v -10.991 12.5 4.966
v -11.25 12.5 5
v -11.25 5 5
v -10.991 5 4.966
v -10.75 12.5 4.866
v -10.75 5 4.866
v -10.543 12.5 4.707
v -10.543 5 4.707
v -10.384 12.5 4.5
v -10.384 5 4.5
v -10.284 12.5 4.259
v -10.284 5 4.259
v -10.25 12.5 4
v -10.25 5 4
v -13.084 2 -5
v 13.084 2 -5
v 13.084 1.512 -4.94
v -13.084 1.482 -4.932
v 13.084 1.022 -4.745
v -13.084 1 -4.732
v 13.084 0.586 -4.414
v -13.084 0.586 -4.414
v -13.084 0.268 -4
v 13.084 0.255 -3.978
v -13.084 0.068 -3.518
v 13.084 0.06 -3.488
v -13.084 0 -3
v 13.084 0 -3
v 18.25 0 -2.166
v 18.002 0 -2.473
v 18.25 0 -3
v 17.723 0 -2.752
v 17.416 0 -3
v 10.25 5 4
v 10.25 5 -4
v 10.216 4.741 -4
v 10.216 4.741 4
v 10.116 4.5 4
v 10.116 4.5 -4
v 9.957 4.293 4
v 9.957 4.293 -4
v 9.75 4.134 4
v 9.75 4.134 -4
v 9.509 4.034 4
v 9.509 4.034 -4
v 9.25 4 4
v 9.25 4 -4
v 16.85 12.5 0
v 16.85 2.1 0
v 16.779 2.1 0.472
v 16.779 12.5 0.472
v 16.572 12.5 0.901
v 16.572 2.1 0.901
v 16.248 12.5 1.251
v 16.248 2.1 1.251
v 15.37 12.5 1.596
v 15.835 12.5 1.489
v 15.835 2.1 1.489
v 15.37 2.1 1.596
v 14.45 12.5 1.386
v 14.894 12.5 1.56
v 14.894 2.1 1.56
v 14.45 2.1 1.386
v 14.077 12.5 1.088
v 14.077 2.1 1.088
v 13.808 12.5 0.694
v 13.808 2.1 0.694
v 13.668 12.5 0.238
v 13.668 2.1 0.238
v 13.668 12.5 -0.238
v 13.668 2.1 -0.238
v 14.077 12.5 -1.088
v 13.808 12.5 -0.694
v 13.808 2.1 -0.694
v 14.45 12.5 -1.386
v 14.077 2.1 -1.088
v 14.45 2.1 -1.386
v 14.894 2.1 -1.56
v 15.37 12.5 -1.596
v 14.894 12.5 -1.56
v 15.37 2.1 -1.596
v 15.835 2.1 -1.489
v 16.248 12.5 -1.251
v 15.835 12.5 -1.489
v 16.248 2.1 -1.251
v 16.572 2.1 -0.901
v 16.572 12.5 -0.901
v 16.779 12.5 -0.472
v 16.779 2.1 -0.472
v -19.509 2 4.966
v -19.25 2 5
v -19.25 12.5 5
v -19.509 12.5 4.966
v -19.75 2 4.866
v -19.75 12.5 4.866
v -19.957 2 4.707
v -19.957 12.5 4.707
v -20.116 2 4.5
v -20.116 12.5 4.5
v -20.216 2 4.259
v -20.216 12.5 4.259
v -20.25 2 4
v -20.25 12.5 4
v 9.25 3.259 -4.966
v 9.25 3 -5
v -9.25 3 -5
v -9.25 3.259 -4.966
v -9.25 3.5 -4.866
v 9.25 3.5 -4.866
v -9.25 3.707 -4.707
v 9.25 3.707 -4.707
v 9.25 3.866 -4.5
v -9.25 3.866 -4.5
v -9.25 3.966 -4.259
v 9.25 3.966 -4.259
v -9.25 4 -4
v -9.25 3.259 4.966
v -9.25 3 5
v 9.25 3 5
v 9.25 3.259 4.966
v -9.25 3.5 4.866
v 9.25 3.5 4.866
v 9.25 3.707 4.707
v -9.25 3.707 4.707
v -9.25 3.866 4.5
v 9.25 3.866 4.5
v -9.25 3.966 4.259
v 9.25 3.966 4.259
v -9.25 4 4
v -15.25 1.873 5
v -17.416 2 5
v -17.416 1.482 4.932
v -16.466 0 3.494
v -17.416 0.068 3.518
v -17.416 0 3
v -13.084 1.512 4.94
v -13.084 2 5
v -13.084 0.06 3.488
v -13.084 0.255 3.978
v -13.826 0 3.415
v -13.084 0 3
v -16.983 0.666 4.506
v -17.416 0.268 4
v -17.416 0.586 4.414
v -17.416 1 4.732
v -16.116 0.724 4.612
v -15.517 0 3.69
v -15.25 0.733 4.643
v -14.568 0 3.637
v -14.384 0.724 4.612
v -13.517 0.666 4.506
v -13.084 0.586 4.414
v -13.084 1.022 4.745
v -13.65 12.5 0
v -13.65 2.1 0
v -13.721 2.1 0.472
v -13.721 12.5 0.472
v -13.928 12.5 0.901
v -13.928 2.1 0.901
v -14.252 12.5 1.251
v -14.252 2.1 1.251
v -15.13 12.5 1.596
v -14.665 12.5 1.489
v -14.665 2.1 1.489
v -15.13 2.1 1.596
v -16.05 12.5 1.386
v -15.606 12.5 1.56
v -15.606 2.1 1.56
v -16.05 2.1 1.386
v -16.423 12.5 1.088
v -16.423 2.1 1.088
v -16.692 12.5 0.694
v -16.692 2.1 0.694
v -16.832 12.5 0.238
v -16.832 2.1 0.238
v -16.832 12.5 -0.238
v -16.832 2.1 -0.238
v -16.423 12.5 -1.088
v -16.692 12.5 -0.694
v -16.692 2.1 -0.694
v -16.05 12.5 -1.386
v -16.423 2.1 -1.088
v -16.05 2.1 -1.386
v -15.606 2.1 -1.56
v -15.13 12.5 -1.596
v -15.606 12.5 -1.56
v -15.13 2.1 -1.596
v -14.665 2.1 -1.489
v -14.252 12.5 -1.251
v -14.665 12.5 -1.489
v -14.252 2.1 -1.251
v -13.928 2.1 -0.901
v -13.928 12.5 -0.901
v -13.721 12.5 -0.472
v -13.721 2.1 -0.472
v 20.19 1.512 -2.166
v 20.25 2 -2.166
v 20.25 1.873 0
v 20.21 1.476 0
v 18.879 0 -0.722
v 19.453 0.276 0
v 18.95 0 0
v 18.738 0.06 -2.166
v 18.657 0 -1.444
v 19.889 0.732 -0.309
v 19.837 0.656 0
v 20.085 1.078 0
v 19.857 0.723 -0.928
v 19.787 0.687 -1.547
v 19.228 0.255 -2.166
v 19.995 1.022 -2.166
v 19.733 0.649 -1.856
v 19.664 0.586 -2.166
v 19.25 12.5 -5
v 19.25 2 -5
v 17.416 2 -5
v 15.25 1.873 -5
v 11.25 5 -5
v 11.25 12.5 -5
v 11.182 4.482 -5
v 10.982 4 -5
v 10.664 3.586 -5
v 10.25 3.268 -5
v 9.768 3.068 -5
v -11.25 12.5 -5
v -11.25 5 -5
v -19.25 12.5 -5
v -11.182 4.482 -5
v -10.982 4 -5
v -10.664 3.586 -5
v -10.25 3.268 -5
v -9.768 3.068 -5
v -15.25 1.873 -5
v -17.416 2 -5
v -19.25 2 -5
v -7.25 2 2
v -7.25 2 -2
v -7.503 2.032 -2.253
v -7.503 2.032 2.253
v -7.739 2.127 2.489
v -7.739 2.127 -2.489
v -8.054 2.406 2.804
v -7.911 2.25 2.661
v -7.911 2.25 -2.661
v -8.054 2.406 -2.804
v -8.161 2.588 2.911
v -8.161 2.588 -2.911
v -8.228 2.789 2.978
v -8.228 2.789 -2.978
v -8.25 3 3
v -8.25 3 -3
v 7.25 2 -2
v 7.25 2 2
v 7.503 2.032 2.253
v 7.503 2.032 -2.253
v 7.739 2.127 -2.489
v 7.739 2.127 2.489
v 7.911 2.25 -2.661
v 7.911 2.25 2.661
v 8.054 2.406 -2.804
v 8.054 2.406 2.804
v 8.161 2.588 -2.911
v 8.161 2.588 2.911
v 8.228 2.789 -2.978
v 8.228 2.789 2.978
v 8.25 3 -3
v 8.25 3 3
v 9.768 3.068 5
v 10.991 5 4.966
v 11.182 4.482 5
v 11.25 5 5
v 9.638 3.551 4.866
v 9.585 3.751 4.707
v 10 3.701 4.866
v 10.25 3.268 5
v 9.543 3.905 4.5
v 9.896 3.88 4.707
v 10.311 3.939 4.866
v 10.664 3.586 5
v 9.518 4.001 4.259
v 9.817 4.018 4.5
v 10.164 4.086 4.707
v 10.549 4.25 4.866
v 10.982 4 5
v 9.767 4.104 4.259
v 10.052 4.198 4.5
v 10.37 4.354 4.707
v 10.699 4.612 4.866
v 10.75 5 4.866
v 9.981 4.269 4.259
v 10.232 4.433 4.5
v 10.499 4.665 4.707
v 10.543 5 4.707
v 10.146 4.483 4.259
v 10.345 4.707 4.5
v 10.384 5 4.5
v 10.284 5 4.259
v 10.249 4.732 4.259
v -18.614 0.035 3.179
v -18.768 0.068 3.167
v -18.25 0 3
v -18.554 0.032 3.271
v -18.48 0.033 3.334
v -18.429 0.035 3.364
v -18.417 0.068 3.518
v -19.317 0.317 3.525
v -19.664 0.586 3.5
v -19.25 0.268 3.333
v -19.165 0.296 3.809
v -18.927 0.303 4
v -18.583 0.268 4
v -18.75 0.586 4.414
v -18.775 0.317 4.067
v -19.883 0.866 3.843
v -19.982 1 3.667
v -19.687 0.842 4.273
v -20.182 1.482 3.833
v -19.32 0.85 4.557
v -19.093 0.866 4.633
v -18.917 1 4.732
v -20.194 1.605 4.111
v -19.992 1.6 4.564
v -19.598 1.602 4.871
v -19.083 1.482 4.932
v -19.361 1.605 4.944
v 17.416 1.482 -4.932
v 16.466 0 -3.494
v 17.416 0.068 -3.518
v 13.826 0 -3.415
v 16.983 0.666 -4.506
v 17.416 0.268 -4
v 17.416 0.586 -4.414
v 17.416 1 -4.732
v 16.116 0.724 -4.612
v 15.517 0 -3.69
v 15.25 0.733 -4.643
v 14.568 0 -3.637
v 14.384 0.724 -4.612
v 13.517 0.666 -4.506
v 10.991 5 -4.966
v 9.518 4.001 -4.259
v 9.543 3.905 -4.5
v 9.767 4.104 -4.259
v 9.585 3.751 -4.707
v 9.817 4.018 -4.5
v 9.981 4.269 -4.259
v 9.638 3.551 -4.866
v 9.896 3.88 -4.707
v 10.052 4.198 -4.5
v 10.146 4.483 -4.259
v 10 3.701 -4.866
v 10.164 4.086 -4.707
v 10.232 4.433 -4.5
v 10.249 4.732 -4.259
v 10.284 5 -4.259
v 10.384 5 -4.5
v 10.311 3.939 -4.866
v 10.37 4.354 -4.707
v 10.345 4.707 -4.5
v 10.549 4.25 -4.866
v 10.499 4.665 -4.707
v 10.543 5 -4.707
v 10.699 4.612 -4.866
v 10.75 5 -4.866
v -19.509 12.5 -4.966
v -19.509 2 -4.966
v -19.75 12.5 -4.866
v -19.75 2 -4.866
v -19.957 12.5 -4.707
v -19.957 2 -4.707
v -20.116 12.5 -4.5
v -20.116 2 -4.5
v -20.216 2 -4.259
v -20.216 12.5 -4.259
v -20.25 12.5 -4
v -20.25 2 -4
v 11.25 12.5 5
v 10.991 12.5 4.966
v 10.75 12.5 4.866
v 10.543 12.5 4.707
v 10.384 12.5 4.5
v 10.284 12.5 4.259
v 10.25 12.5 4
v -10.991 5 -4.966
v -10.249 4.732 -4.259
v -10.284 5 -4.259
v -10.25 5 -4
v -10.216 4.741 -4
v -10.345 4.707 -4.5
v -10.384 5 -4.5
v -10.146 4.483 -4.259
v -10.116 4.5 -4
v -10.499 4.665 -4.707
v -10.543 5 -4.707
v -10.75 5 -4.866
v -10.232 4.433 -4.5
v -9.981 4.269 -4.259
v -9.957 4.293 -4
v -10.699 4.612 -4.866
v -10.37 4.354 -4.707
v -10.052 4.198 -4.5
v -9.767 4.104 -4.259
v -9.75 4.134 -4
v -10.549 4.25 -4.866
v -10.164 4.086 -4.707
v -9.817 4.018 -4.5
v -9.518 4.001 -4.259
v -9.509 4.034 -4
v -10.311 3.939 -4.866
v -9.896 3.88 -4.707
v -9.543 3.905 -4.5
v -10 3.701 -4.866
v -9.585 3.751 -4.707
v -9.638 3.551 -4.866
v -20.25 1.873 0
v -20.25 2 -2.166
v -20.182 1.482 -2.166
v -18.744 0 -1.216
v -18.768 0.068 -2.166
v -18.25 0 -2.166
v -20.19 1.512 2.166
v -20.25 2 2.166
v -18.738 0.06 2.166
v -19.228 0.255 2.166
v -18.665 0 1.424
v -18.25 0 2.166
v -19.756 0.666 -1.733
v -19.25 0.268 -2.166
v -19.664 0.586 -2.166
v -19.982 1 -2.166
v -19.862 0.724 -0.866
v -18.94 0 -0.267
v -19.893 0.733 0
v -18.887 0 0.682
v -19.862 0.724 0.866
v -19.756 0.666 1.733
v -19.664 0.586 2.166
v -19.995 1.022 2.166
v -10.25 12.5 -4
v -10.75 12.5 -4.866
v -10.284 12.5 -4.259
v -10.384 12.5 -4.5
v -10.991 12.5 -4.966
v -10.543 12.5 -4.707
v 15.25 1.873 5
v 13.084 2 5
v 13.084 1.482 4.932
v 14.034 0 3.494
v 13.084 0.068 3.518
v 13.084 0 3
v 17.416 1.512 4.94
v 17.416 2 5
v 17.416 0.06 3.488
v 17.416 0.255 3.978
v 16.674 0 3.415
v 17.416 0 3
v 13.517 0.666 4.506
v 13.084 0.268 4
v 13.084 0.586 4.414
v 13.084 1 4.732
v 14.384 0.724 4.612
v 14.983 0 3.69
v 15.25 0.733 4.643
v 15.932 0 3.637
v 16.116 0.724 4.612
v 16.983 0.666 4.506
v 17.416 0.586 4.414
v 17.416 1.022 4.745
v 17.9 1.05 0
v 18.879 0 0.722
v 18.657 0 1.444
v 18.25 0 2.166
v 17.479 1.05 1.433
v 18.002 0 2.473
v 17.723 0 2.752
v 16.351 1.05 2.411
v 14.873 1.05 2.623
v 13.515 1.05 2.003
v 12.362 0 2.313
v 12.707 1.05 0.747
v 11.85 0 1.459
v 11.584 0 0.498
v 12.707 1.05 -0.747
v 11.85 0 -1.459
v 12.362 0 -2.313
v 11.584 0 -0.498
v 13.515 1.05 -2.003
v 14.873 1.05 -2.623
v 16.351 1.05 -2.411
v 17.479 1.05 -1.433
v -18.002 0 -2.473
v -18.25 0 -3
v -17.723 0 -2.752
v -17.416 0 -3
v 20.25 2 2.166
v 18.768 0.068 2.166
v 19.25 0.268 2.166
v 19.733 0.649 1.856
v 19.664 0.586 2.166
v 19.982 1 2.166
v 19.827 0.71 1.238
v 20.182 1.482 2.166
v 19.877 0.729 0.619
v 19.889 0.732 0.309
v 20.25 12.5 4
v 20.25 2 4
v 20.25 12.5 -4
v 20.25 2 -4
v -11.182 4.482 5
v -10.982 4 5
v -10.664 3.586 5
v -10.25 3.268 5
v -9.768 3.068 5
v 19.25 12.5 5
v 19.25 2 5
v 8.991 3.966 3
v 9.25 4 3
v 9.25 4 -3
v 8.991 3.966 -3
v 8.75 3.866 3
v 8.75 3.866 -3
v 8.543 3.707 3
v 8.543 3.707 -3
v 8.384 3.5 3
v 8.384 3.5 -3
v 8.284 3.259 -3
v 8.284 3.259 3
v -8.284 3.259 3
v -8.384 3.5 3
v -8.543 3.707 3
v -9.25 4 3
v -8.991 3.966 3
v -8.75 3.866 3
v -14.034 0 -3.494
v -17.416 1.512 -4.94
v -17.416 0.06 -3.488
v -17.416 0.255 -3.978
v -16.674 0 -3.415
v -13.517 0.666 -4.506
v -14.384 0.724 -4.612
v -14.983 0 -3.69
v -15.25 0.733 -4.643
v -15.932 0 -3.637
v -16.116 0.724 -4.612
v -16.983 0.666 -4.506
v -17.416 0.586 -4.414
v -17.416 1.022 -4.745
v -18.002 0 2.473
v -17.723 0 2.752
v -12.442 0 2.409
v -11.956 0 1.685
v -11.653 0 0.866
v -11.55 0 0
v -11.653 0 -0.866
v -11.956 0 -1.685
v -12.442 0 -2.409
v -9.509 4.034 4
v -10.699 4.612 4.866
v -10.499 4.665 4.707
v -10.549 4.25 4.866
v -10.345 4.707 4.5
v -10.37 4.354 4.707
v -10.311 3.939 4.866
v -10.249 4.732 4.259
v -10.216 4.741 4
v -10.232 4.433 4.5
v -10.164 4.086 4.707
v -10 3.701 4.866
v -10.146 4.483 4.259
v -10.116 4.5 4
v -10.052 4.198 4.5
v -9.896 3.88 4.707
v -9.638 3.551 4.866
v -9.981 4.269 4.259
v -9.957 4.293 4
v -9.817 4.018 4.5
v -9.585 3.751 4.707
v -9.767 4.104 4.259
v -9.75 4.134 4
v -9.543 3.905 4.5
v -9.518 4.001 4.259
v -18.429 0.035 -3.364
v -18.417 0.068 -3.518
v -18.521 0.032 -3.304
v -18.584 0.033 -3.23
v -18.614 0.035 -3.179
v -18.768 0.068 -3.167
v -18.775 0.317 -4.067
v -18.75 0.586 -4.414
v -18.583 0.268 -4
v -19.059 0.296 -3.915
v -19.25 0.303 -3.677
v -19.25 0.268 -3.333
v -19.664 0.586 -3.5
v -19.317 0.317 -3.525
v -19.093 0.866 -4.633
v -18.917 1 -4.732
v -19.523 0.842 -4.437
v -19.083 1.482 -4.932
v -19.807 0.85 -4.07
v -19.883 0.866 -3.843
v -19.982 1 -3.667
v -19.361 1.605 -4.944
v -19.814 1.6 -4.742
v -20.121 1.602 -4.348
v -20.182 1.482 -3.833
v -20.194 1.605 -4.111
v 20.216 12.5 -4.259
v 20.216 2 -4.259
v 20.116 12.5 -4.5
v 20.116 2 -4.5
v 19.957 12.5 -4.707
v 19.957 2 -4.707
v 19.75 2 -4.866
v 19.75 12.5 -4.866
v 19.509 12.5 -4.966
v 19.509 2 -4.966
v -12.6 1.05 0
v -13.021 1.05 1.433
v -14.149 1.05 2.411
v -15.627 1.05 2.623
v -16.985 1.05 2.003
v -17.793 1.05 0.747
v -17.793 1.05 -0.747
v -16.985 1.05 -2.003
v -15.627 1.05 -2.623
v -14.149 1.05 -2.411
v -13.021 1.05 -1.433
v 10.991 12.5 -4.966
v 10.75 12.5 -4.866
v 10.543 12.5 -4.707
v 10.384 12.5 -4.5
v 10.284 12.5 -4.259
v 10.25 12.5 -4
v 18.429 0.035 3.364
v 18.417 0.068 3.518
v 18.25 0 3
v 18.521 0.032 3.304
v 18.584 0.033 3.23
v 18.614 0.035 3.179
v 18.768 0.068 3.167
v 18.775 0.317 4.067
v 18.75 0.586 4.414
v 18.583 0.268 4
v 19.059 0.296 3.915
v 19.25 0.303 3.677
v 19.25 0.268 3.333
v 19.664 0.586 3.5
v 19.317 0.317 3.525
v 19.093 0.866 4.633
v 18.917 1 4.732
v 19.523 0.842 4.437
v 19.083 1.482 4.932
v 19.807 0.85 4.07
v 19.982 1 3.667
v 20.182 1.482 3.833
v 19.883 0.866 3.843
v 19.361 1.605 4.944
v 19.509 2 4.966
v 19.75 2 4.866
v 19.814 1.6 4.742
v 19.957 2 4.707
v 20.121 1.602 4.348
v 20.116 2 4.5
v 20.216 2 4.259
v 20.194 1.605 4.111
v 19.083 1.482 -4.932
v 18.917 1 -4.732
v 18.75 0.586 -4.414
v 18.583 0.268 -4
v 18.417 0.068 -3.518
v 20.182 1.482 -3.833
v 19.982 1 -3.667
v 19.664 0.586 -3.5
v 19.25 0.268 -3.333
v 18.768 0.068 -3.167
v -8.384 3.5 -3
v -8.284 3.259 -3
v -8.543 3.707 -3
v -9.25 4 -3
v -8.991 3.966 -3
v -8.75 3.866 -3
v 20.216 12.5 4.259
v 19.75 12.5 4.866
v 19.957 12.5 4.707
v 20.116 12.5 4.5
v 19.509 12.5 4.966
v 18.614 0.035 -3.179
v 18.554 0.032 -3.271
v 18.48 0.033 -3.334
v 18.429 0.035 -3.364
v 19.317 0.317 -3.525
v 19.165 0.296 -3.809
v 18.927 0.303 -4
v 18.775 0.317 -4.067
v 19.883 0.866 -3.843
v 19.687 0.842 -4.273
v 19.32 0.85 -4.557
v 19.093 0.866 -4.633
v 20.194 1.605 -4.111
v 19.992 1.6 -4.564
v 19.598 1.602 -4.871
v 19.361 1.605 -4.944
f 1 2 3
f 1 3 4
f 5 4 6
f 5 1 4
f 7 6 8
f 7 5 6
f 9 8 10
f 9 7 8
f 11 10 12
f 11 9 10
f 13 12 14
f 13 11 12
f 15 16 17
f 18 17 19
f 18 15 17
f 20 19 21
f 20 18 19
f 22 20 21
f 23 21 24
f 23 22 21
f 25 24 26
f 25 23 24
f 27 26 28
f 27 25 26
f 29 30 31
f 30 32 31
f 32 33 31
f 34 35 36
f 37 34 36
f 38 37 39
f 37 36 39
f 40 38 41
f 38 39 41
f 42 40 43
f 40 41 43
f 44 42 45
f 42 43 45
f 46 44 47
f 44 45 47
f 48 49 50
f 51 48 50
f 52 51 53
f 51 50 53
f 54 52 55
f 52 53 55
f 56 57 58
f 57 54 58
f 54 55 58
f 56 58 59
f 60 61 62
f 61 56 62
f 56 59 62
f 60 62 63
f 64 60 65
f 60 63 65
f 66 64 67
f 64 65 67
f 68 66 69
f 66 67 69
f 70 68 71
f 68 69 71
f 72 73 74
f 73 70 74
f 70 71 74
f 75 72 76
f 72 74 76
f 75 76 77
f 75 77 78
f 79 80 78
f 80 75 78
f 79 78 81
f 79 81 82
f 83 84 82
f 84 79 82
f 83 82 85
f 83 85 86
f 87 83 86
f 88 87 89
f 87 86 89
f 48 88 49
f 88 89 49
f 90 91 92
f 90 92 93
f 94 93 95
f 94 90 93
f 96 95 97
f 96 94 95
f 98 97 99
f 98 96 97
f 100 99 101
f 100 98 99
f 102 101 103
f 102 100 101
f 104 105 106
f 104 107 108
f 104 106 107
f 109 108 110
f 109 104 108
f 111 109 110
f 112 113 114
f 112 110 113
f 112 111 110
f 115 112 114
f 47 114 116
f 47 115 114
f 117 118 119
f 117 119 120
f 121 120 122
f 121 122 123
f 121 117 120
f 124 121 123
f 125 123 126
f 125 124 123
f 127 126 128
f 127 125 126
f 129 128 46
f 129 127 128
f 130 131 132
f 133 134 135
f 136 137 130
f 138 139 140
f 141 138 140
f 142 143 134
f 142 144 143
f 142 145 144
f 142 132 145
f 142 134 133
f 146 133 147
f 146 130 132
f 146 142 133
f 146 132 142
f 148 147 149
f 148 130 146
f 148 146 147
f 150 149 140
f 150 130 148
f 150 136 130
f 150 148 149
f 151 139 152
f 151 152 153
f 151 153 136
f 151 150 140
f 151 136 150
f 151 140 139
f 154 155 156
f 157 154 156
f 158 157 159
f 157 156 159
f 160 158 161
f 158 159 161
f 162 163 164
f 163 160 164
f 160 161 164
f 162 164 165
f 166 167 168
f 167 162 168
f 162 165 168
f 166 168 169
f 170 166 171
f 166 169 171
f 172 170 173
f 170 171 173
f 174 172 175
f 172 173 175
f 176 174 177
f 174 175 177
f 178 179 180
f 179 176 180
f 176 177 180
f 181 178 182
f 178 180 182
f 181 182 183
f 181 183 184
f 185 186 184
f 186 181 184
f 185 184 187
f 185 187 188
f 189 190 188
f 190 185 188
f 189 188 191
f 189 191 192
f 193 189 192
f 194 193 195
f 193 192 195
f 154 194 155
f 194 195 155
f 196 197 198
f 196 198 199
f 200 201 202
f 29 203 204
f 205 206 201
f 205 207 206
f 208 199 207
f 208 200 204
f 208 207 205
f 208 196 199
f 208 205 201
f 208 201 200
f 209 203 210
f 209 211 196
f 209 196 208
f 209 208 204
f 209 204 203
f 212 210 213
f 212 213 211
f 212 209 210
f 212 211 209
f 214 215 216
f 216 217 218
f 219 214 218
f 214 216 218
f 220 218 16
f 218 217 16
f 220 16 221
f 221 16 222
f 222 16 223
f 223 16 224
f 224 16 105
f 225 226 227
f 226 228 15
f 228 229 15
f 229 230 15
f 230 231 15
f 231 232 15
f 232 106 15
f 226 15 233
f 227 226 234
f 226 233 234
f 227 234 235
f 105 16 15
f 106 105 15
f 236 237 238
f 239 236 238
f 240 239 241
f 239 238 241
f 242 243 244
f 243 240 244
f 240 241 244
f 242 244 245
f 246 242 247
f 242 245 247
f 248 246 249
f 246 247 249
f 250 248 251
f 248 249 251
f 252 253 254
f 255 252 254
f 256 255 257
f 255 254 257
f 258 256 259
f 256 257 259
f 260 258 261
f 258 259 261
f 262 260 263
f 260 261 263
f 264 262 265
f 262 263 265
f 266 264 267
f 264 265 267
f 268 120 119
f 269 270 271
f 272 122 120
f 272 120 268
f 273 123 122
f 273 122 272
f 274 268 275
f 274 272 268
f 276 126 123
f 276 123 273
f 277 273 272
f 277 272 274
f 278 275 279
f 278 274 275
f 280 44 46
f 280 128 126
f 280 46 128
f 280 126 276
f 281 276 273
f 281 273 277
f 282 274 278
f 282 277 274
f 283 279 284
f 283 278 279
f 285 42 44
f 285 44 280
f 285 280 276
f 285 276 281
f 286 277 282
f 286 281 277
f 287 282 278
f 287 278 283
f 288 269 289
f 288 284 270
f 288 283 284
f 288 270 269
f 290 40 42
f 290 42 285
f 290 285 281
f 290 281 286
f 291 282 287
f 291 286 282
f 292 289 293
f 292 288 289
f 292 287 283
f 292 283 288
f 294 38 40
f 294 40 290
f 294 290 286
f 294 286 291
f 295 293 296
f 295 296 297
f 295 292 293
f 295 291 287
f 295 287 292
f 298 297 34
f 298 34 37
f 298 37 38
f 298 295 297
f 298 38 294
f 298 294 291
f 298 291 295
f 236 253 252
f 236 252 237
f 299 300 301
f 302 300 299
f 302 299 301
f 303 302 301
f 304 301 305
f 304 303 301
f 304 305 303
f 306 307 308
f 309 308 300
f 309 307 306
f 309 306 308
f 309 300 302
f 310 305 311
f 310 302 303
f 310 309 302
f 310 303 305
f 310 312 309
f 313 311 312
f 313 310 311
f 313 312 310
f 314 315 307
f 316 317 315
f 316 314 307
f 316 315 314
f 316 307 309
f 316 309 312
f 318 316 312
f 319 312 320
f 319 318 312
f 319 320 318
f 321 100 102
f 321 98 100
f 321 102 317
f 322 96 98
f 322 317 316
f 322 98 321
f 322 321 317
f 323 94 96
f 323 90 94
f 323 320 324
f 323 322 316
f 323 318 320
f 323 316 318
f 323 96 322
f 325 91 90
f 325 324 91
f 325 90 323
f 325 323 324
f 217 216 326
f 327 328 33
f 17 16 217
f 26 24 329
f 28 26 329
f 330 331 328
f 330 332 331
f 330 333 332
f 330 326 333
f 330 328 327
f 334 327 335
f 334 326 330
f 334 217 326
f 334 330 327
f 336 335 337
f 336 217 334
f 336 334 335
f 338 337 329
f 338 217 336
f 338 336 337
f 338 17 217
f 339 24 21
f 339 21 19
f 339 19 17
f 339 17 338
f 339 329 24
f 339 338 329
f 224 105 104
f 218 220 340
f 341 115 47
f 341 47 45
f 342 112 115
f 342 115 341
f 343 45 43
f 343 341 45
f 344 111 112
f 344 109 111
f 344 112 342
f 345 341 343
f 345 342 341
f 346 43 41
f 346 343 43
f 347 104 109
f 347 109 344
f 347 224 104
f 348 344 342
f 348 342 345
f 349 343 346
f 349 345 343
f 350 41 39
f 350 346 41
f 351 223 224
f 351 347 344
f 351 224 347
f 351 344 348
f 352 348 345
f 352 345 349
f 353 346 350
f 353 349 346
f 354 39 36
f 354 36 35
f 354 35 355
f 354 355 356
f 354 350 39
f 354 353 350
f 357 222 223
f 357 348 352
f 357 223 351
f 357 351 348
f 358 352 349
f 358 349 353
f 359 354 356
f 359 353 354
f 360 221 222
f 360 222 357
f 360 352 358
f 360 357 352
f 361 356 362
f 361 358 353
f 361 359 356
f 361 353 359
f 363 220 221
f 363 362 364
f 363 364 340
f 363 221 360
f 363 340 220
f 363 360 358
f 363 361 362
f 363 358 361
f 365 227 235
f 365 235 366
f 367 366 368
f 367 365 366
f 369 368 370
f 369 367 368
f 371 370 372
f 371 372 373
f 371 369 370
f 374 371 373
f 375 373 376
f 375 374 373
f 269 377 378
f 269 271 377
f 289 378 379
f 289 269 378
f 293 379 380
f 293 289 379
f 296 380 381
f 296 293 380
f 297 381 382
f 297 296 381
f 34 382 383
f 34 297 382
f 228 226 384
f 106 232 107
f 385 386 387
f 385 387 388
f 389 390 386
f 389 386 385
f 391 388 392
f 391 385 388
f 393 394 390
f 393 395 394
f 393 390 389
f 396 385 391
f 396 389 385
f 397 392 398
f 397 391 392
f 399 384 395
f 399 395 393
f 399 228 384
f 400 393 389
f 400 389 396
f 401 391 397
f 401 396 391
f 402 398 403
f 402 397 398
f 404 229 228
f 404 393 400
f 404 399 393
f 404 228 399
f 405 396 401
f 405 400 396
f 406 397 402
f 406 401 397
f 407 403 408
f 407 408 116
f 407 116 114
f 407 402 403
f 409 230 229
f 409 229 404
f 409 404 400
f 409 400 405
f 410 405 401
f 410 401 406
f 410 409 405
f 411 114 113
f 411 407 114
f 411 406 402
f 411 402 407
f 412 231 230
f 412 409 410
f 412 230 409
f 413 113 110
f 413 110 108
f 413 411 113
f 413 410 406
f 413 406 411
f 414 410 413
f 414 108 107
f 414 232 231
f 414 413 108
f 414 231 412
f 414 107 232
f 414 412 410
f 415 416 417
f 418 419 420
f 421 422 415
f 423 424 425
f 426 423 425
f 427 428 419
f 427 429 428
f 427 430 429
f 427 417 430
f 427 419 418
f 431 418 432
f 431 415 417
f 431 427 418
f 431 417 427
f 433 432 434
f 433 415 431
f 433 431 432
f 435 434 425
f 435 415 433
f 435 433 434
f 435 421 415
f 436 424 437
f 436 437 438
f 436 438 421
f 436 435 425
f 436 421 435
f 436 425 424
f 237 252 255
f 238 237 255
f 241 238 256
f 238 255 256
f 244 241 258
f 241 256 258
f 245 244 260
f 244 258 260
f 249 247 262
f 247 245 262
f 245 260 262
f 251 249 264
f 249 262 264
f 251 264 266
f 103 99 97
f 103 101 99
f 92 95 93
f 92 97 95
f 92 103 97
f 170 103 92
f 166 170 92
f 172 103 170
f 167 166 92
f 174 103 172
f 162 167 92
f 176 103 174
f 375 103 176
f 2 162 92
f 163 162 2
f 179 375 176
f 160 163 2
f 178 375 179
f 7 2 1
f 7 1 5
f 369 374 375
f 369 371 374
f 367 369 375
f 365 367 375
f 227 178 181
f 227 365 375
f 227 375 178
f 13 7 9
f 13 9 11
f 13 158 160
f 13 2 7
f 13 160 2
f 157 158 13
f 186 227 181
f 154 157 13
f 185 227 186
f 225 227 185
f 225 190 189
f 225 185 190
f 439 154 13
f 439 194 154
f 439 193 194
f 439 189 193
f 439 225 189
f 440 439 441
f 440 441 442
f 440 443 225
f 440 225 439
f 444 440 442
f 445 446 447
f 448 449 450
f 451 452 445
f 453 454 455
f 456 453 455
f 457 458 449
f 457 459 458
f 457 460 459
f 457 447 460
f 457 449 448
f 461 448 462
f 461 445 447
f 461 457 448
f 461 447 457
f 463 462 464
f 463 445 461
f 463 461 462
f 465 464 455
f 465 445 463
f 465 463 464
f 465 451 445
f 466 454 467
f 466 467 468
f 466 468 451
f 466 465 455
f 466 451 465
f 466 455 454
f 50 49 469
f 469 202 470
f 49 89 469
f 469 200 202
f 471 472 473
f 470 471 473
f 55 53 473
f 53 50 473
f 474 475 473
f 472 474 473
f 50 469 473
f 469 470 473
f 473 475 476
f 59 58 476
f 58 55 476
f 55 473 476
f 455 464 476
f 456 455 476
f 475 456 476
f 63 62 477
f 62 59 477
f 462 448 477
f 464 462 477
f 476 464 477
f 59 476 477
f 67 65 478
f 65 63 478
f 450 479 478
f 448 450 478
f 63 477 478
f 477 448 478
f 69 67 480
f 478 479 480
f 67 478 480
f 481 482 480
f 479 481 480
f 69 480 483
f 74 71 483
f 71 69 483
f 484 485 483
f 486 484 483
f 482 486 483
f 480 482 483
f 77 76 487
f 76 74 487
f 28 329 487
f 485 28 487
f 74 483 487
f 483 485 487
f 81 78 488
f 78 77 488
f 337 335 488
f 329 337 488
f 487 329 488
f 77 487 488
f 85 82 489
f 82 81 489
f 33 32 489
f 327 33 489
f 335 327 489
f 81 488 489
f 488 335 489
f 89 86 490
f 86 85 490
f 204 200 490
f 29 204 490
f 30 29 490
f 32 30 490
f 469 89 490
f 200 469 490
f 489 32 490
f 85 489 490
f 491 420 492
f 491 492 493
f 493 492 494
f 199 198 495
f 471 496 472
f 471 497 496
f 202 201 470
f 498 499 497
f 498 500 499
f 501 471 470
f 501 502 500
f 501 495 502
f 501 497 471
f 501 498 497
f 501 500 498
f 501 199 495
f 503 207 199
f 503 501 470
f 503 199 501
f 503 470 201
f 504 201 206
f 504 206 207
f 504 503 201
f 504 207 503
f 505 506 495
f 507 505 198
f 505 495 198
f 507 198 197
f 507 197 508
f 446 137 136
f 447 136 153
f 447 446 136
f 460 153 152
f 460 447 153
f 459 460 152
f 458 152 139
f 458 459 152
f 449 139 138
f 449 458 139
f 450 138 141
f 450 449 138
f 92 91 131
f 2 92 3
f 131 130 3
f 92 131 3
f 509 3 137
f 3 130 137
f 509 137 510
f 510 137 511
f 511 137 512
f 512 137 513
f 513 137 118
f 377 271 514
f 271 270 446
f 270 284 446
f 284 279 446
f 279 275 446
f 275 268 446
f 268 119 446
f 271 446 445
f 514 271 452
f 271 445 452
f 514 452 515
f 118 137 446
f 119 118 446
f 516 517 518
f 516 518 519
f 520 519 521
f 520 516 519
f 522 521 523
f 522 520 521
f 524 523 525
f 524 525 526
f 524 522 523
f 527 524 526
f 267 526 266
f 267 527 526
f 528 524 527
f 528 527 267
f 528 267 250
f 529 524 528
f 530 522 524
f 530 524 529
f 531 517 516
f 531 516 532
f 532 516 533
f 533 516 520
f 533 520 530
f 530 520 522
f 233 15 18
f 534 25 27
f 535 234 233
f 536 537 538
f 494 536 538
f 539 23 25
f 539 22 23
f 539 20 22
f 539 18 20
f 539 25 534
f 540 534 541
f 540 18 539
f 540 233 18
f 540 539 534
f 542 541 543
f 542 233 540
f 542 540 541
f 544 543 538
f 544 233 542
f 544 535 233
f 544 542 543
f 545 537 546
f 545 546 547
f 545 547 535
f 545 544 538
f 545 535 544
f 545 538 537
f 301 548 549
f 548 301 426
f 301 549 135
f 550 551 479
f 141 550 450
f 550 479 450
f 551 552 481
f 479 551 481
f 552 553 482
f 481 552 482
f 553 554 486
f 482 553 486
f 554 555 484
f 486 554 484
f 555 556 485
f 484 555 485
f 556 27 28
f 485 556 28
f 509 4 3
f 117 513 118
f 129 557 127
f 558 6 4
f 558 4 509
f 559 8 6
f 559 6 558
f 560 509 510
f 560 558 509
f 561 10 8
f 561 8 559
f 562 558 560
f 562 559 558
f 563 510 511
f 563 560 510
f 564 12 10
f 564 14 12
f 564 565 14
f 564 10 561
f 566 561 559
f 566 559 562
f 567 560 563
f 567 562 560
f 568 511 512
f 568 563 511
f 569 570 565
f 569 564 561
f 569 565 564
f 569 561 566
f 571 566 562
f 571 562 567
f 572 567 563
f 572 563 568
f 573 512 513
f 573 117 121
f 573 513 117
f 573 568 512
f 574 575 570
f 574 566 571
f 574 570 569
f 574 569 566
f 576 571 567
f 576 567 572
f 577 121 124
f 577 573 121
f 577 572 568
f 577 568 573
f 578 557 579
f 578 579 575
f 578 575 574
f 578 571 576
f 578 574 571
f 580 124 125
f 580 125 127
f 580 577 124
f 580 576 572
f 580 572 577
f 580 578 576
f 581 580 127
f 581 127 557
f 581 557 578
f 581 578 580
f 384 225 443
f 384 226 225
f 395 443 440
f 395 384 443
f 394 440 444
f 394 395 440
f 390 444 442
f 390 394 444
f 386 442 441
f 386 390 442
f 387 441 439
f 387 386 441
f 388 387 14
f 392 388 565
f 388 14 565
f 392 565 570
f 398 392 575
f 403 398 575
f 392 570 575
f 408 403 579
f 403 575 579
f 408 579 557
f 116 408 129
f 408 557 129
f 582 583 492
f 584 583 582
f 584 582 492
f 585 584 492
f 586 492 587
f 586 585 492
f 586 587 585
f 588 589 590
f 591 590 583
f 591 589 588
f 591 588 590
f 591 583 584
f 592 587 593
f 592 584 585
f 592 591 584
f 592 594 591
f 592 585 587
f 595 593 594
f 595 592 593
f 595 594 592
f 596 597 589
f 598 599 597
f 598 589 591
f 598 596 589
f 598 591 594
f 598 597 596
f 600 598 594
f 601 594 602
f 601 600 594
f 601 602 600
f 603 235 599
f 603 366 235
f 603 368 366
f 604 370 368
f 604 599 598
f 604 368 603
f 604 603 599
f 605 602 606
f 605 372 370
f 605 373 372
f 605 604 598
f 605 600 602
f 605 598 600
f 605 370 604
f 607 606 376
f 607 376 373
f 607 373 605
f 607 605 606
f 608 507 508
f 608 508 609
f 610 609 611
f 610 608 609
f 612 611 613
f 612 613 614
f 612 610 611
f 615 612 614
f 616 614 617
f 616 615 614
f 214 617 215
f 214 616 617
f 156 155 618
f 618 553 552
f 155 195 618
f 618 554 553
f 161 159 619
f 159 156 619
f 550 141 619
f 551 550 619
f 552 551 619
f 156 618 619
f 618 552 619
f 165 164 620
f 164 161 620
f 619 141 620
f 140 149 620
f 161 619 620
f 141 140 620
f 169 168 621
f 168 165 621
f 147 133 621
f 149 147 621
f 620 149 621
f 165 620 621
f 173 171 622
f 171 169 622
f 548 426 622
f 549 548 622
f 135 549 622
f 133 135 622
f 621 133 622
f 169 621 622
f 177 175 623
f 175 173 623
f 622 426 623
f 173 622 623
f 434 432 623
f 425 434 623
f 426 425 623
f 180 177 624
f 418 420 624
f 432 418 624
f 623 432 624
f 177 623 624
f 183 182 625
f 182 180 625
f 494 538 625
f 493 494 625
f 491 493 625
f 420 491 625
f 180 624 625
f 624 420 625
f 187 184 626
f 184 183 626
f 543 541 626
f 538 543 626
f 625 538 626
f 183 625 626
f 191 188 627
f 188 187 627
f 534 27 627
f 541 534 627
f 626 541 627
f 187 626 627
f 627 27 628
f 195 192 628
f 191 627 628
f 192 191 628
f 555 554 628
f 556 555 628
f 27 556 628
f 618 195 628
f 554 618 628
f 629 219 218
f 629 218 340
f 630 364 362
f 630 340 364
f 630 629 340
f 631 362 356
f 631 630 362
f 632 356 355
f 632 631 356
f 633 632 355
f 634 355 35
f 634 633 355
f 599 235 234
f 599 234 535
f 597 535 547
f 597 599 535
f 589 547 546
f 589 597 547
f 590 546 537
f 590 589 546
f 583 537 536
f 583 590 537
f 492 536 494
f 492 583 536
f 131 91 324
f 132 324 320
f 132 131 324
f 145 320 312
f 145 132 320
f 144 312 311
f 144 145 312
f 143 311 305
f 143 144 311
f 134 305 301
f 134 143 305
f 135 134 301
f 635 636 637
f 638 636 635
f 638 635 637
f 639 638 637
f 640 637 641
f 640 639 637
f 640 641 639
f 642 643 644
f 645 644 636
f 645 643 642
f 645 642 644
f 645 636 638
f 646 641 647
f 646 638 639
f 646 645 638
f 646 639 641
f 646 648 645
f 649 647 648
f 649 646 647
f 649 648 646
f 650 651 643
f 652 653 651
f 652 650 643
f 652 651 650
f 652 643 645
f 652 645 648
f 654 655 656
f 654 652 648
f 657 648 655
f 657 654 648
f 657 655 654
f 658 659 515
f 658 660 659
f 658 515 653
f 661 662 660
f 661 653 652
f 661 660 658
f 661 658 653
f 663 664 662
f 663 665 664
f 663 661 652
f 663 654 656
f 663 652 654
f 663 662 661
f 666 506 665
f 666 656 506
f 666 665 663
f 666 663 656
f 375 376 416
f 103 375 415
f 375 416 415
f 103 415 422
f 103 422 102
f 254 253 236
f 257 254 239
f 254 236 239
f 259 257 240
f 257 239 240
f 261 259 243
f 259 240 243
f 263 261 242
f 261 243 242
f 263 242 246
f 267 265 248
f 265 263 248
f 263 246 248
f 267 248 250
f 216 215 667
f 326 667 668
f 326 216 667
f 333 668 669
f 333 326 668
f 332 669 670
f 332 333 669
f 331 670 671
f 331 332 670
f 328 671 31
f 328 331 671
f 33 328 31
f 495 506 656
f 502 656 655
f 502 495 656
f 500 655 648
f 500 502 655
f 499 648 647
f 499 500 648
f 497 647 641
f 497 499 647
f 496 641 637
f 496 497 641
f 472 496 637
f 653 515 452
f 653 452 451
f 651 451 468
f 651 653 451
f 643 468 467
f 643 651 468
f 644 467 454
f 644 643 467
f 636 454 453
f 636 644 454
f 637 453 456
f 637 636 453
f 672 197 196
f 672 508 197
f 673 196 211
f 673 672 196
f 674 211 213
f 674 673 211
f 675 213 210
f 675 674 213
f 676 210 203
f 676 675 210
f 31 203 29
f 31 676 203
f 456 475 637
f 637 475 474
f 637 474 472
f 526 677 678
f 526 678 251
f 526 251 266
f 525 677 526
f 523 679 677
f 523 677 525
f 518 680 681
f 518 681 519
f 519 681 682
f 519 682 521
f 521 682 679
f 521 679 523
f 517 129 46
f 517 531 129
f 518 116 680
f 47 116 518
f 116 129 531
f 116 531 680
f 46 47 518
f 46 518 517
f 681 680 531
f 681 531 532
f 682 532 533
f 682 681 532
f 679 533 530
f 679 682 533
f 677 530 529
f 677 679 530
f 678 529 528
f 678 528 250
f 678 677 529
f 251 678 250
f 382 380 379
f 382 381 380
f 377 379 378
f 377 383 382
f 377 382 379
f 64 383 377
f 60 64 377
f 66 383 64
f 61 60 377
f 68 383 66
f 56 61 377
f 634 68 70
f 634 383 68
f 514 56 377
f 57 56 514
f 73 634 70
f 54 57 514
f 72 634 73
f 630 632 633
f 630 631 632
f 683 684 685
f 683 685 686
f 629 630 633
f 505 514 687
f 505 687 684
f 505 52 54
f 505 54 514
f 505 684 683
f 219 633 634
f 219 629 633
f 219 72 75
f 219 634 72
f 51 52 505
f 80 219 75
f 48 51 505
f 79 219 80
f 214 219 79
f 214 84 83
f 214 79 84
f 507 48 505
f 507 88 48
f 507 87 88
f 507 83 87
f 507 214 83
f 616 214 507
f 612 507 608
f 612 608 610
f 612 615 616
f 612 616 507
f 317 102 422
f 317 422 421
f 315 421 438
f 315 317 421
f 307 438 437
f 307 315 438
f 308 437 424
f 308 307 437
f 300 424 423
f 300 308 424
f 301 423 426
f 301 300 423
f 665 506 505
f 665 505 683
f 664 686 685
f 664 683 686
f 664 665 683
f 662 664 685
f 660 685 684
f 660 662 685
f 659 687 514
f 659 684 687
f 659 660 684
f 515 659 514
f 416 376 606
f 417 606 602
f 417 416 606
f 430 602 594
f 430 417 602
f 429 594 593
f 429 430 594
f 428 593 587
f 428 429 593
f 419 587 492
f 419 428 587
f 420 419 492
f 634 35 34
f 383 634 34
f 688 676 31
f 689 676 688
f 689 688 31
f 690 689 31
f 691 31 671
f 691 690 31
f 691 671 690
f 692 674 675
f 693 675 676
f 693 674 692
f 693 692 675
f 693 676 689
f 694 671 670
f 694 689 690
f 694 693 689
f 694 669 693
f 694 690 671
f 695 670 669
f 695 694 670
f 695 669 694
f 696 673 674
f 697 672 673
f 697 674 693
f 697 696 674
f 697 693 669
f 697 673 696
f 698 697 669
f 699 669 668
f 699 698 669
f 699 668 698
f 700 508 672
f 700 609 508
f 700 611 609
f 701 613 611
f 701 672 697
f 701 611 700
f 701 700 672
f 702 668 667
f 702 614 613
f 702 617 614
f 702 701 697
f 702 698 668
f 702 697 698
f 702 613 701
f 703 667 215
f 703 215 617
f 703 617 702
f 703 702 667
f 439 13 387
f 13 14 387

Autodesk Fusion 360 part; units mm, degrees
sketch "Esquisse1" plane through (0, 0, 0) normal (0, 1, 0) x (1, 0, 0)
  line L0 (20.25, 5) -> (-20.25, 5)
  line L1 (-20.25, 5) -> (-20.25, -5)
  line L2 (-20.25, -5) -> (20.25, -5)
  line L3 (20.25, -5) -> (20.25, 5)
  line L4 (20.25, 5) -> (-20.25, -5) construction
  line L5 (-20.25, 5) -> (20.25, -5) construction
  dimension "d1" = 40.5
  dimension "d2" = 10
extrude "Extrusion1" add sketch "Esquisse1" along normal blind 4
sketch "Esquisse5" plane through (0, 0, 0) normal (0, 1, 0) x (1, 0, 0)
  line L0 (-10.25, 5) -> (-20.25, 5)
  line L1 (-20.25, 5) -> (-20.25, -5)
  line L2 (-20.25, -5) -> (-10.25, -5)
  line L3 (-10.25, -5) -> (-10.25, 5)
  line L4 (-10.25, 5) -> (-20.25, -5) construction
  line L5 (-20.25, 5) -> (-10.25, -5) construction
  circle A0 centre (-15.25, 0) radius 1.6
  line L6 (20.25, 5) -> (-20.25, 5)
  point P0 (-15.25, 0)
  dimension "d26" = 10
  dimension "d27" = 10
  dimension "d28" = 15.25
  dimension "d29" = 3.2
  dimension "d46" = 5
extrude "Extrusion7" add sketch "Esquisse5" along normal blind 12.5
extrude "Extrusion8" cut sketch "Esquisse5" along normal blind 4 contours A0
sketch "Esquisse6" plane through (0, 0, 0) normal (0, 1, 0) x (1, 0, 0)
  line L0 (20.25, -5) -> (20.25, 5)
  line L1 (10.25, 5) -> (20.25, -5) construction
  line L2 (10.25, 5) -> (10.25, -5)
  line L3 (20.25, 5) -> (10.25, 5)
  line L4 (10.25, -5) -> (20.25, -5)
  circle A0 centre (15.25, 0) radius 1.6
  line L5 (20.25, 5) -> (10.25, -5) construction
  line L6 (20.25, 5) -> (-20.25, 5)
  point P0 (15.25, 0)
  point P1 (28, 0)
  point P2 (28, 0)
  dimension "d34" = 10
  dimension "d35" = 10
  dimension "d37" = 3.2
  dimension "d38" = 15.25
  dimension "d47" = 5
extrude "Extrusion9" add sketch "Esquisse6" along normal blind 12.5
extrude "Extrusion10" cut sketch "Esquisse6" along normal blind 4 contours A0
chamfer "Chanfrein3" distance 2.1 angle 45 2 edges at (-16.7417, 0, 0.5786) (13.7583, 0, 0.5786)
sketch "Esquisse8" plane through (0, 4, 0) normal (0, 1, 0) x (-1, 0, 0)
  line L0 (-10.25, 5) -> (-10.25, -5)
  line L1 (-10.25, -5) -> (10.25, -5)
  line L2 (10.25, -5) -> (10.25, 5)
  line L3 (10.25, 5) -> (-10.25, 5)
  line L4 (8.25, -3) -> (-8.25, -3)
  line L5 (-8.25, -3) -> (-8.25, 3)
  line L6 (-8.25, 3) -> (8.25, 3)
  line L7 (8.25, 3) -> (8.25, -3)
  line L8 (8.25, -3) -> (-8.25, 3) construction
  line L9 (-8.25, -3) -> (8.25, 3) construction
  dimension "d52" = 16.5
  dimension "d53" = 6
extrude "Extrusion12" cut sketch "Esquisse8" against normal blind 2 contours L4 L5 L6 L7
fillet "Congé1" radius 1 2 edges at (-10.25, 4, 0) (10.25, 4, 0)
fillet "Congé2" radius 1 14 edges at (-10.25, 8.75, 5) (-9.9571, 4.2929, 5) (0, 4, 5) (9.9571, 4.2929, 5) (10.25, 8.75, 5) (10.25, 8.75, -5) (9.9571, 4.2929, -5) (0, 4, -5) (-9.9571, 4.2929, -5) (-10.25, 8.75, -5) (20.25, 6.25, 5) (-20.25, 6.25, -5) (20.25, 6.25, -5) (-20.25, 6.25, 5)
fillet "Congé3" radius 2 8 edges at (20.25, 0, 0) (19.9571, 0, -4.7071) (0, 0, -5) (-19.9571, 0, -4.7071) (-20.25, 0, 0) (-19.9571, 0, 4.7071) (0, 0, 5) (19.9571, 0, 4.7071)
fillet "Congé4" radius 1 6 edges at (0, 2, -3) (8.25, 2, 0) (-8.25, 2, 0) (0, 2, 3) (-8.25, 4, 0) (8.25, 4, 0)
equation "d1 = portée_pont + longueur_pile * 2"
equation "d2 = largeur_pont"
equation "d3 = epaisseur_pont"
equation "portée_pont = 20.5 mm"
equation "hauteur_pont = 8.5 mm"
equation "longueur_pile = vis_dia_tete + 3 mm"
equation "vis_dia_percage = 3.2 mm"
equation "epaisseur_pont = 4 mm"
equation "largeur_pont = vis_dia_tete + 3 mm"
equation "d26 = longueur_pile"
equation "d27 = largeur_pont"
equation "d28 = portée_pont / 2 + longueur_pile / 2"
equation "d29 = vis_dia_percage"
equation "d30 = epaisseur_pont + hauteur_pont"
equation "d32 = epaisseur_pont"
equation "d34 = longueur_pile"
equation "d35 = largeur_pont"
equation "d37 = vis_dia_percage"
equation "d38 = portée_pont / 2 + longueur_pile / 2"
equation "d39 = hauteur_pont + epaisseur_pont"
equation "d41 = epaisseur_pont"
equation "vis_dia_tete = 7 mm"
equation "d46 = largeur_pont / 2"
equation "d47 = largeur_pont / 2"
equation "d52 = portée_pont - 4 mm"
equation "d53 = largeur_pont - 4 mm"
equation "d54 = -epaisseur_pont + 2 mm"
equation "d58 = ( vis_dia_tete - vis_dia_percage ) / 2 + 0.2 mm"
